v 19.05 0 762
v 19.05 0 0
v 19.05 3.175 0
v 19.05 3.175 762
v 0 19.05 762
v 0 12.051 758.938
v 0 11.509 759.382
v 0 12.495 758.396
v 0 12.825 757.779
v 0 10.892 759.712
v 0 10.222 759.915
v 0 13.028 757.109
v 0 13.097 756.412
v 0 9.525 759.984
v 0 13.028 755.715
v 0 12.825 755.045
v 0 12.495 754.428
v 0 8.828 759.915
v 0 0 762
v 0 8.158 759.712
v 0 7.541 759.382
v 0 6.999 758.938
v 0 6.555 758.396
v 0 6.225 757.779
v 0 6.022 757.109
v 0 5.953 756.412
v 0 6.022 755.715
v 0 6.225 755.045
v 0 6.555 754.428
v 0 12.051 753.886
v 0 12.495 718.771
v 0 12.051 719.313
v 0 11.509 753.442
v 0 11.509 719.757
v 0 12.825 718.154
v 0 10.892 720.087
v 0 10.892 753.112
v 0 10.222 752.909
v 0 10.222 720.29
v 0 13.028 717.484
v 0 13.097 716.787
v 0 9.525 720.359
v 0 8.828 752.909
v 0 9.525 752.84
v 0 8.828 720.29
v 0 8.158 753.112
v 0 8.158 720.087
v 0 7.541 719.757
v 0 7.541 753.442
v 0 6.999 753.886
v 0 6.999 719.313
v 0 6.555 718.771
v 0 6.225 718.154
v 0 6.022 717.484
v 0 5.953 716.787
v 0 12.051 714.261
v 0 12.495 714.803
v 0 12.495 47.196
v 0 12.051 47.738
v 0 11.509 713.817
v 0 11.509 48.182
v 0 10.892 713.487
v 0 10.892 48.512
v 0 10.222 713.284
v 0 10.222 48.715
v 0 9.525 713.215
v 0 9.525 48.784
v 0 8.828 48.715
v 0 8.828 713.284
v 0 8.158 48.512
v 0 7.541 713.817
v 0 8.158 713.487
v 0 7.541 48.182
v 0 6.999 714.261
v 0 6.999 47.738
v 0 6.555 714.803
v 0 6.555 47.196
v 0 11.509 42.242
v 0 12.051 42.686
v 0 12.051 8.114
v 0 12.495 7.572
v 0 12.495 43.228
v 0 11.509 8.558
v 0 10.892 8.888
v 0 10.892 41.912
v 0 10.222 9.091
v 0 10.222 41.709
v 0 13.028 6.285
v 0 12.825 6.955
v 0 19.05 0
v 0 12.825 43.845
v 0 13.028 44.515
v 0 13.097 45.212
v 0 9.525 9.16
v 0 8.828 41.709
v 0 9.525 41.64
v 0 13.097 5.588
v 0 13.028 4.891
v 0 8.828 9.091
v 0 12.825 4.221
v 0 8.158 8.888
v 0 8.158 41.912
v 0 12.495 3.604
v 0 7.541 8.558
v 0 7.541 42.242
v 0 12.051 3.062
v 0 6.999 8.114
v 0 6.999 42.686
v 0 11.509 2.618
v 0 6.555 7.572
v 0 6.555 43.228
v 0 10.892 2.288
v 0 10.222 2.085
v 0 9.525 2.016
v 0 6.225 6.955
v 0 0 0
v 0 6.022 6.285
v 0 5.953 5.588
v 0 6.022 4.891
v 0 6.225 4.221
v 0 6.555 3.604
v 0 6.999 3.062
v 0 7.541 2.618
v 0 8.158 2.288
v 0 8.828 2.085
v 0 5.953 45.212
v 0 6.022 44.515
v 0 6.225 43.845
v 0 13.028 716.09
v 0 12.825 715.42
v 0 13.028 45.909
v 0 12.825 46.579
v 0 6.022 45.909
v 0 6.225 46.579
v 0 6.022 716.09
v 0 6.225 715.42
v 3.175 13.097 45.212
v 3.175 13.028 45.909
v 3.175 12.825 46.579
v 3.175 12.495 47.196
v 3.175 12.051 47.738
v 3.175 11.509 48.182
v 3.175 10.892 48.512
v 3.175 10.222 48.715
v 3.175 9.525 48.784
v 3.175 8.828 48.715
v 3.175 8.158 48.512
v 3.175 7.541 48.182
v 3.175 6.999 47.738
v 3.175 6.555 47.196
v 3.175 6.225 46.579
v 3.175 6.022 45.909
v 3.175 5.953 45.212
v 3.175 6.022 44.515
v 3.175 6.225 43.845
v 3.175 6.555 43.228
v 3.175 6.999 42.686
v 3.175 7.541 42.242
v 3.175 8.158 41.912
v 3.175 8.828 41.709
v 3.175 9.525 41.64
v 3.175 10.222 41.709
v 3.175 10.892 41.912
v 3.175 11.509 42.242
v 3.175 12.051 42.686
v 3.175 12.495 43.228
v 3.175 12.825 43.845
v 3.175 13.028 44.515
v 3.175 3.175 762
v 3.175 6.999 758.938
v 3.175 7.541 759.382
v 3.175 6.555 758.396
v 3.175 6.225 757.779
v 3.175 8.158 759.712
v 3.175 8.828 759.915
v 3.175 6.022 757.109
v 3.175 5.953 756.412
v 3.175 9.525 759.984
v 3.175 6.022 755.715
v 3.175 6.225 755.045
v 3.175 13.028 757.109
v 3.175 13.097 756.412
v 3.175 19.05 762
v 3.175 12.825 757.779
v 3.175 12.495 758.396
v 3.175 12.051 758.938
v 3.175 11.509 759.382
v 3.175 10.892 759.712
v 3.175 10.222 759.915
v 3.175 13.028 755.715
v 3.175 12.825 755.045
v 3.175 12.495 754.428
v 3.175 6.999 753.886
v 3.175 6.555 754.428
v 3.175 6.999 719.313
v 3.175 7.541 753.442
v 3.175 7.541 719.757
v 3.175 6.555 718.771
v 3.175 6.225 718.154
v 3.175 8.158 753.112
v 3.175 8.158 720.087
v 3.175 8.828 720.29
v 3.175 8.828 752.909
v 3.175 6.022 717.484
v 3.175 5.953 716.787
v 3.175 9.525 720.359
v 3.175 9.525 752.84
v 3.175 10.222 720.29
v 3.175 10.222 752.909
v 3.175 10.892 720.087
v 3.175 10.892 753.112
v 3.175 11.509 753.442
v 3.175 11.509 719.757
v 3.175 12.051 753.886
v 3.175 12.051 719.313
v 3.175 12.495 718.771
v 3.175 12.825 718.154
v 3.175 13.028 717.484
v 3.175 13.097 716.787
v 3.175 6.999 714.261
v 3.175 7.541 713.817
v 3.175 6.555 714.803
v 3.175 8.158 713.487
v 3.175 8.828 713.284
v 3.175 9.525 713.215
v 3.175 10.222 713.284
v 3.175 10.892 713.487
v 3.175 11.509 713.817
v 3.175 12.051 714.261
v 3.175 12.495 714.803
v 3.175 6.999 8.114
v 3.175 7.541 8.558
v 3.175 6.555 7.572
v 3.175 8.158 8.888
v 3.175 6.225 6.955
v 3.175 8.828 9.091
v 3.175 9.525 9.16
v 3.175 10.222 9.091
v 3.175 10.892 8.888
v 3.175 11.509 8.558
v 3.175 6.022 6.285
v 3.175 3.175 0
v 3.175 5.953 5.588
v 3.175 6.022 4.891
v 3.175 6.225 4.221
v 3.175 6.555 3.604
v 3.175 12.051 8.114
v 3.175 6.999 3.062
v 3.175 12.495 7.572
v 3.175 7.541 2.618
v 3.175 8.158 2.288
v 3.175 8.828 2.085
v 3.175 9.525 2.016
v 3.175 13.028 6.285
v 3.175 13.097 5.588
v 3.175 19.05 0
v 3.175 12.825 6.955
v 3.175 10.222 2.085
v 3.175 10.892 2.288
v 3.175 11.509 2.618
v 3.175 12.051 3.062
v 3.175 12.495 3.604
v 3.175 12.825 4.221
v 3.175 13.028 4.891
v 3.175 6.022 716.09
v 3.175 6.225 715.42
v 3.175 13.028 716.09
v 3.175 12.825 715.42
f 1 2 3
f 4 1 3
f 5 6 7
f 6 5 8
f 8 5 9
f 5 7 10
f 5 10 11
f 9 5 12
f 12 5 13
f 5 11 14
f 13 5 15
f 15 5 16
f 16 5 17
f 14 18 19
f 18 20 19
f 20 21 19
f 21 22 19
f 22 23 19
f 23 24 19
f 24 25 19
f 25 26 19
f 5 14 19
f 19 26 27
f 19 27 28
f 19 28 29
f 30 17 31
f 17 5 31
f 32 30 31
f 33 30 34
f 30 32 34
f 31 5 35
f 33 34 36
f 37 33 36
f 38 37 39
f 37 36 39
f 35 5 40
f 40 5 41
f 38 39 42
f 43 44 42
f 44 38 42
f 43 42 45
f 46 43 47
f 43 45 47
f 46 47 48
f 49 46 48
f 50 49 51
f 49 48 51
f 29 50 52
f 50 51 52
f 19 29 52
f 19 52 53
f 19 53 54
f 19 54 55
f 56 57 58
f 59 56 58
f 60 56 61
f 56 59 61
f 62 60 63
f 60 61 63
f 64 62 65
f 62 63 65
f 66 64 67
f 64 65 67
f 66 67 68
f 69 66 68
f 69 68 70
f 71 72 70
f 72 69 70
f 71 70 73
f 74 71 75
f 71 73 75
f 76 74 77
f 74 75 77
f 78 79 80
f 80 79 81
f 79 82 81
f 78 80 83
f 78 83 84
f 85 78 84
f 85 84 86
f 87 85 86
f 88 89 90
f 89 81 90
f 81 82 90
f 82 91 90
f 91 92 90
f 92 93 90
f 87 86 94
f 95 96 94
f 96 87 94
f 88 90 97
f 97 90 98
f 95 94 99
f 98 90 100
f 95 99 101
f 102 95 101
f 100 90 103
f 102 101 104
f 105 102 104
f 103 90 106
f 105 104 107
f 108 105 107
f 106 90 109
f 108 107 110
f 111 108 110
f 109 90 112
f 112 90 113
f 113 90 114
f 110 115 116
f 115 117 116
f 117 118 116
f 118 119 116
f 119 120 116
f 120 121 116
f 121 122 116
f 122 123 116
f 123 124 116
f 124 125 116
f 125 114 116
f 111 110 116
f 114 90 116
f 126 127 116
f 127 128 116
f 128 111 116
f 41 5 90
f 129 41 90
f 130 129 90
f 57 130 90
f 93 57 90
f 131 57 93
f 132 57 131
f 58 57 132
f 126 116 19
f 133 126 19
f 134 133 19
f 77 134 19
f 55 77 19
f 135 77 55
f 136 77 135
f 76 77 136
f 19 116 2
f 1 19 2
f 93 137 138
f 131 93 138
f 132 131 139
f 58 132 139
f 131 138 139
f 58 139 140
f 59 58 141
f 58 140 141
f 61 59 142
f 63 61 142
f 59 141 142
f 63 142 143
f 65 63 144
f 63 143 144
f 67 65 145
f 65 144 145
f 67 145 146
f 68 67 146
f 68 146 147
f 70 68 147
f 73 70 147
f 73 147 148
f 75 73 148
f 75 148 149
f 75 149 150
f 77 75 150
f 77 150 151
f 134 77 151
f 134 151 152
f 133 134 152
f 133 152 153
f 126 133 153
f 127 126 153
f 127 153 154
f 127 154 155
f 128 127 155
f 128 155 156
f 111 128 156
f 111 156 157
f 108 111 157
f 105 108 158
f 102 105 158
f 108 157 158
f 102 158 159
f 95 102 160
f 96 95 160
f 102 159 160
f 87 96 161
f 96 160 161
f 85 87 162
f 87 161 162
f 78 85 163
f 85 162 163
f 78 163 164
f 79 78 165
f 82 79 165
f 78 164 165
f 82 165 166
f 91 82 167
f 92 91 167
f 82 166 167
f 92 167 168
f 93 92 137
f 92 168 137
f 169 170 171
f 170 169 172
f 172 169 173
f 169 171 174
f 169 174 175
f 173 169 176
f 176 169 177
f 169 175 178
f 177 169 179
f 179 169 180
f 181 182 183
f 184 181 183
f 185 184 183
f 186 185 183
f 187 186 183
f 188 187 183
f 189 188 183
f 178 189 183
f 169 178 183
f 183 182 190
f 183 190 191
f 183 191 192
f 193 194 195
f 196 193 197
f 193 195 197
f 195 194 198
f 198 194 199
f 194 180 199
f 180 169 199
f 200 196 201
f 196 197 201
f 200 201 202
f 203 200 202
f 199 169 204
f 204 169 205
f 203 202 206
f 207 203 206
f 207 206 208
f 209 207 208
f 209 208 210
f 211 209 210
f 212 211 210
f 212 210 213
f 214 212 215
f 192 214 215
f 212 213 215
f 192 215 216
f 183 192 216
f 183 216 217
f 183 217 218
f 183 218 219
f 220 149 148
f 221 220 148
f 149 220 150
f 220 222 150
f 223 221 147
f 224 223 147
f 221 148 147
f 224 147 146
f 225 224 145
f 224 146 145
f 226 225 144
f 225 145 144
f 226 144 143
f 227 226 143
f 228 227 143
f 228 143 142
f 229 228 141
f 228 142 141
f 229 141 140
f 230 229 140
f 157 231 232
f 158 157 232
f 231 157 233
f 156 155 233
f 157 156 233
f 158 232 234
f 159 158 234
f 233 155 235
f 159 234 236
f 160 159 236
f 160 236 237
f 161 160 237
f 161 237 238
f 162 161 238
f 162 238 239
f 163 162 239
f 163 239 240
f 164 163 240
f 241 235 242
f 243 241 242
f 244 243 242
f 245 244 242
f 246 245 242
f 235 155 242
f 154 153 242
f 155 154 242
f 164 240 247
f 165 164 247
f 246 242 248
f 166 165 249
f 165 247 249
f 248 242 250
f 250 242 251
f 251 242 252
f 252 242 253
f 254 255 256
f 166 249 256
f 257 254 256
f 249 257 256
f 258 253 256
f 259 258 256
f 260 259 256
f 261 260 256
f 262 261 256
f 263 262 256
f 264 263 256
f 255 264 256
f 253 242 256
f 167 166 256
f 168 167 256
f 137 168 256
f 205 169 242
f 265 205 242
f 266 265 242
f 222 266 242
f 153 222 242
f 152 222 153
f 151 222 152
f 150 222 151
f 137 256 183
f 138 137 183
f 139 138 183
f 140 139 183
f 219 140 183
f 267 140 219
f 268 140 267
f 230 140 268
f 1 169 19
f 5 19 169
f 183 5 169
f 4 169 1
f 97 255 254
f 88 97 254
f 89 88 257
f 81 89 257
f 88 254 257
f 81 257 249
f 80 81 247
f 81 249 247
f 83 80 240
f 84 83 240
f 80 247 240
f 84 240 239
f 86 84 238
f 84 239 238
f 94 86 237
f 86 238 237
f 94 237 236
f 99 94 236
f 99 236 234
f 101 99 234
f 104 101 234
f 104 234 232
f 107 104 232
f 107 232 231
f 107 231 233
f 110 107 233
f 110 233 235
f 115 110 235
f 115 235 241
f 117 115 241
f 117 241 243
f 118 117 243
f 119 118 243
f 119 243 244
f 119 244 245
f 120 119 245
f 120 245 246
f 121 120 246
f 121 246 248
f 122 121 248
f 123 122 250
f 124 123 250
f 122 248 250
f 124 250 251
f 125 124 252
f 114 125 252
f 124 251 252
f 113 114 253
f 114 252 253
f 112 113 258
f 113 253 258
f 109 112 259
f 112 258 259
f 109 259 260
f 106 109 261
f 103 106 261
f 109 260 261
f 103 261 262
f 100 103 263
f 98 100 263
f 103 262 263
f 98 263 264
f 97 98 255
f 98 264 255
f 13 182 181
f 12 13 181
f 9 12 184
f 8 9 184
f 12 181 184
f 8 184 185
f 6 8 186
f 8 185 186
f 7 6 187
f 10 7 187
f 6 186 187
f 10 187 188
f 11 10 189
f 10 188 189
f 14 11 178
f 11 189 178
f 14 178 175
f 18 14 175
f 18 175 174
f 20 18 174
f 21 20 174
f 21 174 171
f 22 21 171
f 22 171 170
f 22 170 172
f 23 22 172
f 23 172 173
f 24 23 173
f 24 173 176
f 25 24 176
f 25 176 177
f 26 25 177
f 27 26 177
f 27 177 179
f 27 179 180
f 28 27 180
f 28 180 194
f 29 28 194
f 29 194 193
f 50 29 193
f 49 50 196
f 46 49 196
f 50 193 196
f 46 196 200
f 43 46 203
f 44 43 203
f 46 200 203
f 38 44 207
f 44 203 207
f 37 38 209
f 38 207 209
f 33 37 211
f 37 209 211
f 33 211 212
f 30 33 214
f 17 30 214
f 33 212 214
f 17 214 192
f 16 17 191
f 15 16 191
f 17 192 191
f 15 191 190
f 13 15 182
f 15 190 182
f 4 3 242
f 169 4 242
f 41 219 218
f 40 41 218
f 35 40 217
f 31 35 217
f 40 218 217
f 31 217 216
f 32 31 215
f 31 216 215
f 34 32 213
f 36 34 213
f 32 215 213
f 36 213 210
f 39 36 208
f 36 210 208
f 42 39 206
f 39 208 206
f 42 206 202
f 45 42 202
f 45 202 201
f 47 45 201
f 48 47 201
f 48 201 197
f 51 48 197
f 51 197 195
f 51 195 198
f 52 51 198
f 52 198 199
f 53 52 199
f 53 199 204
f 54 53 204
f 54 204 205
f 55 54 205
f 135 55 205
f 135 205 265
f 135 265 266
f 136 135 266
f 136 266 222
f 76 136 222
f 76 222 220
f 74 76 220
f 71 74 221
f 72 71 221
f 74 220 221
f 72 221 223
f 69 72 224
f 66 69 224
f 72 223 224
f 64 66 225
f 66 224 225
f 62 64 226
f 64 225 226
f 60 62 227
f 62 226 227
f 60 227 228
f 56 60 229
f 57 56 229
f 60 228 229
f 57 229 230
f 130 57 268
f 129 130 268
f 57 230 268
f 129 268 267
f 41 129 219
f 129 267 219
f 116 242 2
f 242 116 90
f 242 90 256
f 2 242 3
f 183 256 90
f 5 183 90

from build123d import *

# Parameters (mm, degrees)
BOSS_EXTRUDE1_DEPTH             = 762
F_9_32_0_28125_DIAMETER_HOLE1_D = 7.14375


with BuildPart() as part:
    # Sketch1 → Boss-Extrude1 (new body)
    with BuildSketch(Plane.XY):
        Polygon((0, 0), (19.05, 0), (19.05, 3.175), (3.175, 3.175), (3.175, 19.05), (0, 19.05), align=None)
    extrude(amount=BOSS_EXTRUDE1_DEPTH)

    # 9/32 (0.28125) Diameter Hole1 (through all)
    with Locations(Plane(origin=(0, 9.525, 5.588), x_dir=(0, -1, 0), z_dir=(-1, 0, 0))):
        with Locations((0, 0), (0, 39.624), (0, 711.199), (0, 750.824)):
            Hole(F_9_32_0_28125_DIAMETER_HOLE1_D / 2)


solid = part.part
